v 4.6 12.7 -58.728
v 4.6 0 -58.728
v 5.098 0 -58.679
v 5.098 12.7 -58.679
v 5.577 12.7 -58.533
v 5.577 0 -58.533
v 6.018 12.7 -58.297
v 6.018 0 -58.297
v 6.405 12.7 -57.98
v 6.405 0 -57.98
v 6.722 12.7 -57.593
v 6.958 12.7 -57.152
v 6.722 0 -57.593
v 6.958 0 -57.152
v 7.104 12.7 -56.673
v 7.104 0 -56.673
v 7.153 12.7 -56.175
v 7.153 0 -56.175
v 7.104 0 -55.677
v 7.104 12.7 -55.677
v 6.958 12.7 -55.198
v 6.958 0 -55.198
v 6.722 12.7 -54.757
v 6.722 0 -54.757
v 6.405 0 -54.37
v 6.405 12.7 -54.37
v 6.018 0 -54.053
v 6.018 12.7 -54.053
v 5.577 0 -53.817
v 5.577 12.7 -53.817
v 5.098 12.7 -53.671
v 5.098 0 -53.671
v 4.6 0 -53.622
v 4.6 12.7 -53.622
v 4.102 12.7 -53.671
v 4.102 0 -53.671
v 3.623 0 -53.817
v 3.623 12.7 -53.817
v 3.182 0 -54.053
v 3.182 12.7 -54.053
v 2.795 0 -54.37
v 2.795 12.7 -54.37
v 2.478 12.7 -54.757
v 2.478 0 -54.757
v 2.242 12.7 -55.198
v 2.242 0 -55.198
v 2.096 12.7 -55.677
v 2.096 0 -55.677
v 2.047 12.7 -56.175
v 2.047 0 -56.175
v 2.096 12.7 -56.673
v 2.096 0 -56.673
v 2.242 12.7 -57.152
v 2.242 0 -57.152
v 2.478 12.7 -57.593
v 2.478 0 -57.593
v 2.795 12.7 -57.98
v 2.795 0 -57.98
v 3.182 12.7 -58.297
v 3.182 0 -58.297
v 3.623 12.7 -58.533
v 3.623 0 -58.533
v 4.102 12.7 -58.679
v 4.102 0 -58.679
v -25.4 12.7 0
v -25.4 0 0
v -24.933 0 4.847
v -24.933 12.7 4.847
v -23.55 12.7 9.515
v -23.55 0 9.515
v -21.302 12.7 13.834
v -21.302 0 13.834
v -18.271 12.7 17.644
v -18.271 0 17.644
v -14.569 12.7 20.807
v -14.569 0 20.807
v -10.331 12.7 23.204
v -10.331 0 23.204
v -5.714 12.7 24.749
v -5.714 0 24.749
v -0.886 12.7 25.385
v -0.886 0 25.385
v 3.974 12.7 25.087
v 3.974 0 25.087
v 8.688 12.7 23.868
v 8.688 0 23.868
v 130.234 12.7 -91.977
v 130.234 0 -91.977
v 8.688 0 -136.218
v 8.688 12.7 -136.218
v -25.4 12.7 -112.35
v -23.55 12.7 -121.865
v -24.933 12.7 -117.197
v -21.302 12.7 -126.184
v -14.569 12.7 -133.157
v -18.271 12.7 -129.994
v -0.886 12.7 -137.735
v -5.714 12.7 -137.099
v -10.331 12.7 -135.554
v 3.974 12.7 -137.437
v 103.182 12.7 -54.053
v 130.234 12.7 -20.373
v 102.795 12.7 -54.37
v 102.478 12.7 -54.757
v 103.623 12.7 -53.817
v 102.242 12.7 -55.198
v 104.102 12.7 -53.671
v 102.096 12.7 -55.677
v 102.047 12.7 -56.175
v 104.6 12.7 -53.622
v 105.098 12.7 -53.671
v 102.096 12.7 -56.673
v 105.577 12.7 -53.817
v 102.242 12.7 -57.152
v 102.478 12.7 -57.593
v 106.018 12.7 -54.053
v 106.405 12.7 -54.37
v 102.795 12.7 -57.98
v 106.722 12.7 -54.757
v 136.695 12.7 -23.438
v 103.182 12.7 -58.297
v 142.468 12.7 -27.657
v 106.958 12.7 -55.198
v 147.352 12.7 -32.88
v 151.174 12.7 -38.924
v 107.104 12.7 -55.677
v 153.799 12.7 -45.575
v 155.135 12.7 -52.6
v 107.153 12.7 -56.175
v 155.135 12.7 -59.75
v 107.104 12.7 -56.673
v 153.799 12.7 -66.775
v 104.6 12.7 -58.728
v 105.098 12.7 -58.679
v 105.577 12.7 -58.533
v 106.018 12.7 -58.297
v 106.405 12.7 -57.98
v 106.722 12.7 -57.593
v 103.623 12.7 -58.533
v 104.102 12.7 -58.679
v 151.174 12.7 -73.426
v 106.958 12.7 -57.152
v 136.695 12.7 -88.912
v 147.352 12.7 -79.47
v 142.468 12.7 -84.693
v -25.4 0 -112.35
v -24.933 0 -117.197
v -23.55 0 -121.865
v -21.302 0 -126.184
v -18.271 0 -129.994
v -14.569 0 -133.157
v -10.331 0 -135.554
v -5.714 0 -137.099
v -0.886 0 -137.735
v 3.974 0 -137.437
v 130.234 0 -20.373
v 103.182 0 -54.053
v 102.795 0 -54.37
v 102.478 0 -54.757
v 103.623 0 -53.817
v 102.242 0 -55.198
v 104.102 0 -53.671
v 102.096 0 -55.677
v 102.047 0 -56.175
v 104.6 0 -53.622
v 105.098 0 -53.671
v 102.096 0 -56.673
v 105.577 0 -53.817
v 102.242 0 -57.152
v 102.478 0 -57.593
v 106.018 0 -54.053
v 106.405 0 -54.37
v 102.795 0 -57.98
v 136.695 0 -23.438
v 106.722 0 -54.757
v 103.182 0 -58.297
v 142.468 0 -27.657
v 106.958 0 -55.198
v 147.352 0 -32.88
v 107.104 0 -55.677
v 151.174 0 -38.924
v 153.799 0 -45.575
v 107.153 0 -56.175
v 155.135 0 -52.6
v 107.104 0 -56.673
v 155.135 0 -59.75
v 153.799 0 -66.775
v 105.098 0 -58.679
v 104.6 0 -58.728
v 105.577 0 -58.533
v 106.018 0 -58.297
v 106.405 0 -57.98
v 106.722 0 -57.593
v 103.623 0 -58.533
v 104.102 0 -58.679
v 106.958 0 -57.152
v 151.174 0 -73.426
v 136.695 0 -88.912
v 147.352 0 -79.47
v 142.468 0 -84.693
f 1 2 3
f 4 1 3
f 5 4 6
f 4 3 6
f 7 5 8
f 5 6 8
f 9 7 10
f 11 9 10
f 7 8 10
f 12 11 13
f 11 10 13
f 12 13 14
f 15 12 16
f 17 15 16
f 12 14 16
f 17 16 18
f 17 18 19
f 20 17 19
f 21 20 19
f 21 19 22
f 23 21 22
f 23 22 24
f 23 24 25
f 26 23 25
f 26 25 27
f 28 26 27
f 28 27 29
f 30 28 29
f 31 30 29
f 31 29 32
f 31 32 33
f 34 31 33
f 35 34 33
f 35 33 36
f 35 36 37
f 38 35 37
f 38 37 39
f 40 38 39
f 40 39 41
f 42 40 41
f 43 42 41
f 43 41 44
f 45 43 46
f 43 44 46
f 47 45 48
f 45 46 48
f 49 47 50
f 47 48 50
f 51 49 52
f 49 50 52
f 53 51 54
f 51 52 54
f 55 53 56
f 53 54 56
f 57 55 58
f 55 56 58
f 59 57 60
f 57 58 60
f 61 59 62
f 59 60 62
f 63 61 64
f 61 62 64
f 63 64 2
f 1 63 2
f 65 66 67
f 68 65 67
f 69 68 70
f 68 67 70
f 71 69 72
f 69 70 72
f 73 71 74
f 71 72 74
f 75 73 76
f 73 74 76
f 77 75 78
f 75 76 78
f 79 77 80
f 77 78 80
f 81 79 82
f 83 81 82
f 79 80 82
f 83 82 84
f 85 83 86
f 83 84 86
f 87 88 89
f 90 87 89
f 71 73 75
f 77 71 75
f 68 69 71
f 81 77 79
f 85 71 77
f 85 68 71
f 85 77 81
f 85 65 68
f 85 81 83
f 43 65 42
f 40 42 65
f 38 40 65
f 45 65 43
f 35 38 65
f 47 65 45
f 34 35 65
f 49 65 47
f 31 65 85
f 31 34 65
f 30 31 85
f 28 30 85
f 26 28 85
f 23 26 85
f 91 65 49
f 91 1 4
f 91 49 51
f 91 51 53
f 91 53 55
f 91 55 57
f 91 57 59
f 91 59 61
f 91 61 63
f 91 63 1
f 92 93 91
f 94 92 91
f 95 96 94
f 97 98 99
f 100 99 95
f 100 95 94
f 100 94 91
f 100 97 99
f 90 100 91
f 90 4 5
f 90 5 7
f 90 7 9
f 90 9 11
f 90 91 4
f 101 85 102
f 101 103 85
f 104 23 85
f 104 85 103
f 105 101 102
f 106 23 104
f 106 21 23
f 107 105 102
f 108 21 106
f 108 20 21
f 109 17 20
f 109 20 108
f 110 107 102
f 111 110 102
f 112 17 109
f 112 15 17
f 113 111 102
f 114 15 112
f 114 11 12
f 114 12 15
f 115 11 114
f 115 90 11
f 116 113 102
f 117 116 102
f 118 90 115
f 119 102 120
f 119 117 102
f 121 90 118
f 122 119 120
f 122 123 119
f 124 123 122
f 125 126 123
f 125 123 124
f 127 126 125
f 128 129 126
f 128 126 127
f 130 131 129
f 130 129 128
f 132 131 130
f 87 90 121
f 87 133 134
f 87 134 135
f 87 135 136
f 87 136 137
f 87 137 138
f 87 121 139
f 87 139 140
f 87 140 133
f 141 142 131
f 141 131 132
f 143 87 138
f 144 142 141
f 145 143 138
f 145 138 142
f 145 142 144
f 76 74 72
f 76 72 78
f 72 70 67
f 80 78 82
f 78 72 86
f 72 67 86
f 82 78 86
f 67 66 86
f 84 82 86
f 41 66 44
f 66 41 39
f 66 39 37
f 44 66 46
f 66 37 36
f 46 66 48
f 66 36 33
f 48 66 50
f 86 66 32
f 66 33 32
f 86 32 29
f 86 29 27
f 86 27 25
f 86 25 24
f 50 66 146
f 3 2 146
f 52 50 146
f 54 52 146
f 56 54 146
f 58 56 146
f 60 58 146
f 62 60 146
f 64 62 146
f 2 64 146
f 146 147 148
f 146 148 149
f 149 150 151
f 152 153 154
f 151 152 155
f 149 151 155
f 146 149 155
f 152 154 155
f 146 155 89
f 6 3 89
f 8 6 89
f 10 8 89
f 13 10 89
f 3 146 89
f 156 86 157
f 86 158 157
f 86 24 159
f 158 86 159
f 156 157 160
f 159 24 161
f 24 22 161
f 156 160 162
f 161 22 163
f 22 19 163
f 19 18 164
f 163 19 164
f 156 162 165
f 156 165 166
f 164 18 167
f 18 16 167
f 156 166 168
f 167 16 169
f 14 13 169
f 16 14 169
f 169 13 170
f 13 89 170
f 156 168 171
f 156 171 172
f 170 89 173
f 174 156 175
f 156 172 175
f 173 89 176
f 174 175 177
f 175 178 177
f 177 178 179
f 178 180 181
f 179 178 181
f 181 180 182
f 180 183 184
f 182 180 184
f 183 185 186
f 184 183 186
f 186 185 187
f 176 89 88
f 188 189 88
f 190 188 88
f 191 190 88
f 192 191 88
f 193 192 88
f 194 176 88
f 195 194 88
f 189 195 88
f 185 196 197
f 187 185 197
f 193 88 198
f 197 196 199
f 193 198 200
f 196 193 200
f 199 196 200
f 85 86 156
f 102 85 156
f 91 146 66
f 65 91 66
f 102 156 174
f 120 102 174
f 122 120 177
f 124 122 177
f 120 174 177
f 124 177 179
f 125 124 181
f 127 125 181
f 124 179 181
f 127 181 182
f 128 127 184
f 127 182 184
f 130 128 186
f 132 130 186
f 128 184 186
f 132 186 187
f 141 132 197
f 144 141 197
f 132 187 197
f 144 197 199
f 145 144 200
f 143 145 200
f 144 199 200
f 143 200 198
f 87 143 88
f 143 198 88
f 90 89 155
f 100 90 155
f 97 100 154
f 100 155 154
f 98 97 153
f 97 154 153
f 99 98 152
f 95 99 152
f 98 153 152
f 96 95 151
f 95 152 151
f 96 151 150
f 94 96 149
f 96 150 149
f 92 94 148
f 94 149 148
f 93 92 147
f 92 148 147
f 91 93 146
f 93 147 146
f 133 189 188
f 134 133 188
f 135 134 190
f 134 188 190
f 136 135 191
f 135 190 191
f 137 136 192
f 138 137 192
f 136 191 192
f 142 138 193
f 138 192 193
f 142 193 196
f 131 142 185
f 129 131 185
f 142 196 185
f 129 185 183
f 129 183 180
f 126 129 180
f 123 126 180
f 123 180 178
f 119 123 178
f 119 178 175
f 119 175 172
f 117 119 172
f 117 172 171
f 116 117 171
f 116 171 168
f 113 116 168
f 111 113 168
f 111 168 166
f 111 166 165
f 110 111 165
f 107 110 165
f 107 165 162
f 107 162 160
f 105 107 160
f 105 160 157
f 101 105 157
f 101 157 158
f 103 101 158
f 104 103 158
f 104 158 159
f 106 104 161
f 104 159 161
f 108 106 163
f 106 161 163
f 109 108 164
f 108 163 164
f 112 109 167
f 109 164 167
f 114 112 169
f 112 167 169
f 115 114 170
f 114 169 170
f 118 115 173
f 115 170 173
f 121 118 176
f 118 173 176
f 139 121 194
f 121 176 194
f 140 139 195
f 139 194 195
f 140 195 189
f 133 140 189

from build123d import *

# Parameters (mm, degrees)
BOSS_EXTRUDE1_DEPTH         = 12.7
F_1_4_20_TAPPED_HOLE1_D     = 5.1054
F_1_4_20_TAPPED_HOLE1_DEPTH = 19.05
F_1_4_20_TAPPED_HOLE1_TIP   = 1.533816902


with BuildPart() as part:
    # Sketch1 → Boss-Extrude1 (new body)
    with BuildSketch(Plane(origin=(0, 0, 0), x_dir=(1, 0, 0), z_dir=(0, 1, 0))):
        with BuildLine():
            Line((8.6875712, -23.868098094), (130.234472266, 20.372852858))
            ThreePointArc((130.234472266, 20.372852858), (155.303115466, 56.175), (130.234472266, 91.977147142))
            Line((130.234472266, 91.977147142), (8.6875712, 136.218098094))
            ThreePointArc((8.6875712, 136.218098094), (-14.568728351, 133.156541141), (-25.4, 112.35))
            Line((-25.4, 112.35), (-25.4, 0))
            ThreePointArc((-25.4, 0), (-14.568728351, -20.806541141), (8.6875712, -23.868098094))
        make_face()
    extrude(amount=BOSS_EXTRUDE1_DEPTH)

    # 1/4-20 Tapped Hole1
    with Locations(Plane(origin=(4.6, 12.7, -56.175), x_dir=(0, 0, 1), z_dir=(0, 1, 0))):
        with Locations((0, 0), (0, 100)):
            Hole(F_1_4_20_TAPPED_HOLE1_D / 2, depth=F_1_4_20_TAPPED_HOLE1_DEPTH)
            with Locations((0, 0, -(F_1_4_20_TAPPED_HOLE1_DEPTH + F_1_4_20_TAPPED_HOLE1_TIP / 2))):  # 118° drill point
                Cone(0, F_1_4_20_TAPPED_HOLE1_D / 2, F_1_4_20_TAPPED_HOLE1_TIP, mode=Mode.SUBTRACT)


solid = part.part
